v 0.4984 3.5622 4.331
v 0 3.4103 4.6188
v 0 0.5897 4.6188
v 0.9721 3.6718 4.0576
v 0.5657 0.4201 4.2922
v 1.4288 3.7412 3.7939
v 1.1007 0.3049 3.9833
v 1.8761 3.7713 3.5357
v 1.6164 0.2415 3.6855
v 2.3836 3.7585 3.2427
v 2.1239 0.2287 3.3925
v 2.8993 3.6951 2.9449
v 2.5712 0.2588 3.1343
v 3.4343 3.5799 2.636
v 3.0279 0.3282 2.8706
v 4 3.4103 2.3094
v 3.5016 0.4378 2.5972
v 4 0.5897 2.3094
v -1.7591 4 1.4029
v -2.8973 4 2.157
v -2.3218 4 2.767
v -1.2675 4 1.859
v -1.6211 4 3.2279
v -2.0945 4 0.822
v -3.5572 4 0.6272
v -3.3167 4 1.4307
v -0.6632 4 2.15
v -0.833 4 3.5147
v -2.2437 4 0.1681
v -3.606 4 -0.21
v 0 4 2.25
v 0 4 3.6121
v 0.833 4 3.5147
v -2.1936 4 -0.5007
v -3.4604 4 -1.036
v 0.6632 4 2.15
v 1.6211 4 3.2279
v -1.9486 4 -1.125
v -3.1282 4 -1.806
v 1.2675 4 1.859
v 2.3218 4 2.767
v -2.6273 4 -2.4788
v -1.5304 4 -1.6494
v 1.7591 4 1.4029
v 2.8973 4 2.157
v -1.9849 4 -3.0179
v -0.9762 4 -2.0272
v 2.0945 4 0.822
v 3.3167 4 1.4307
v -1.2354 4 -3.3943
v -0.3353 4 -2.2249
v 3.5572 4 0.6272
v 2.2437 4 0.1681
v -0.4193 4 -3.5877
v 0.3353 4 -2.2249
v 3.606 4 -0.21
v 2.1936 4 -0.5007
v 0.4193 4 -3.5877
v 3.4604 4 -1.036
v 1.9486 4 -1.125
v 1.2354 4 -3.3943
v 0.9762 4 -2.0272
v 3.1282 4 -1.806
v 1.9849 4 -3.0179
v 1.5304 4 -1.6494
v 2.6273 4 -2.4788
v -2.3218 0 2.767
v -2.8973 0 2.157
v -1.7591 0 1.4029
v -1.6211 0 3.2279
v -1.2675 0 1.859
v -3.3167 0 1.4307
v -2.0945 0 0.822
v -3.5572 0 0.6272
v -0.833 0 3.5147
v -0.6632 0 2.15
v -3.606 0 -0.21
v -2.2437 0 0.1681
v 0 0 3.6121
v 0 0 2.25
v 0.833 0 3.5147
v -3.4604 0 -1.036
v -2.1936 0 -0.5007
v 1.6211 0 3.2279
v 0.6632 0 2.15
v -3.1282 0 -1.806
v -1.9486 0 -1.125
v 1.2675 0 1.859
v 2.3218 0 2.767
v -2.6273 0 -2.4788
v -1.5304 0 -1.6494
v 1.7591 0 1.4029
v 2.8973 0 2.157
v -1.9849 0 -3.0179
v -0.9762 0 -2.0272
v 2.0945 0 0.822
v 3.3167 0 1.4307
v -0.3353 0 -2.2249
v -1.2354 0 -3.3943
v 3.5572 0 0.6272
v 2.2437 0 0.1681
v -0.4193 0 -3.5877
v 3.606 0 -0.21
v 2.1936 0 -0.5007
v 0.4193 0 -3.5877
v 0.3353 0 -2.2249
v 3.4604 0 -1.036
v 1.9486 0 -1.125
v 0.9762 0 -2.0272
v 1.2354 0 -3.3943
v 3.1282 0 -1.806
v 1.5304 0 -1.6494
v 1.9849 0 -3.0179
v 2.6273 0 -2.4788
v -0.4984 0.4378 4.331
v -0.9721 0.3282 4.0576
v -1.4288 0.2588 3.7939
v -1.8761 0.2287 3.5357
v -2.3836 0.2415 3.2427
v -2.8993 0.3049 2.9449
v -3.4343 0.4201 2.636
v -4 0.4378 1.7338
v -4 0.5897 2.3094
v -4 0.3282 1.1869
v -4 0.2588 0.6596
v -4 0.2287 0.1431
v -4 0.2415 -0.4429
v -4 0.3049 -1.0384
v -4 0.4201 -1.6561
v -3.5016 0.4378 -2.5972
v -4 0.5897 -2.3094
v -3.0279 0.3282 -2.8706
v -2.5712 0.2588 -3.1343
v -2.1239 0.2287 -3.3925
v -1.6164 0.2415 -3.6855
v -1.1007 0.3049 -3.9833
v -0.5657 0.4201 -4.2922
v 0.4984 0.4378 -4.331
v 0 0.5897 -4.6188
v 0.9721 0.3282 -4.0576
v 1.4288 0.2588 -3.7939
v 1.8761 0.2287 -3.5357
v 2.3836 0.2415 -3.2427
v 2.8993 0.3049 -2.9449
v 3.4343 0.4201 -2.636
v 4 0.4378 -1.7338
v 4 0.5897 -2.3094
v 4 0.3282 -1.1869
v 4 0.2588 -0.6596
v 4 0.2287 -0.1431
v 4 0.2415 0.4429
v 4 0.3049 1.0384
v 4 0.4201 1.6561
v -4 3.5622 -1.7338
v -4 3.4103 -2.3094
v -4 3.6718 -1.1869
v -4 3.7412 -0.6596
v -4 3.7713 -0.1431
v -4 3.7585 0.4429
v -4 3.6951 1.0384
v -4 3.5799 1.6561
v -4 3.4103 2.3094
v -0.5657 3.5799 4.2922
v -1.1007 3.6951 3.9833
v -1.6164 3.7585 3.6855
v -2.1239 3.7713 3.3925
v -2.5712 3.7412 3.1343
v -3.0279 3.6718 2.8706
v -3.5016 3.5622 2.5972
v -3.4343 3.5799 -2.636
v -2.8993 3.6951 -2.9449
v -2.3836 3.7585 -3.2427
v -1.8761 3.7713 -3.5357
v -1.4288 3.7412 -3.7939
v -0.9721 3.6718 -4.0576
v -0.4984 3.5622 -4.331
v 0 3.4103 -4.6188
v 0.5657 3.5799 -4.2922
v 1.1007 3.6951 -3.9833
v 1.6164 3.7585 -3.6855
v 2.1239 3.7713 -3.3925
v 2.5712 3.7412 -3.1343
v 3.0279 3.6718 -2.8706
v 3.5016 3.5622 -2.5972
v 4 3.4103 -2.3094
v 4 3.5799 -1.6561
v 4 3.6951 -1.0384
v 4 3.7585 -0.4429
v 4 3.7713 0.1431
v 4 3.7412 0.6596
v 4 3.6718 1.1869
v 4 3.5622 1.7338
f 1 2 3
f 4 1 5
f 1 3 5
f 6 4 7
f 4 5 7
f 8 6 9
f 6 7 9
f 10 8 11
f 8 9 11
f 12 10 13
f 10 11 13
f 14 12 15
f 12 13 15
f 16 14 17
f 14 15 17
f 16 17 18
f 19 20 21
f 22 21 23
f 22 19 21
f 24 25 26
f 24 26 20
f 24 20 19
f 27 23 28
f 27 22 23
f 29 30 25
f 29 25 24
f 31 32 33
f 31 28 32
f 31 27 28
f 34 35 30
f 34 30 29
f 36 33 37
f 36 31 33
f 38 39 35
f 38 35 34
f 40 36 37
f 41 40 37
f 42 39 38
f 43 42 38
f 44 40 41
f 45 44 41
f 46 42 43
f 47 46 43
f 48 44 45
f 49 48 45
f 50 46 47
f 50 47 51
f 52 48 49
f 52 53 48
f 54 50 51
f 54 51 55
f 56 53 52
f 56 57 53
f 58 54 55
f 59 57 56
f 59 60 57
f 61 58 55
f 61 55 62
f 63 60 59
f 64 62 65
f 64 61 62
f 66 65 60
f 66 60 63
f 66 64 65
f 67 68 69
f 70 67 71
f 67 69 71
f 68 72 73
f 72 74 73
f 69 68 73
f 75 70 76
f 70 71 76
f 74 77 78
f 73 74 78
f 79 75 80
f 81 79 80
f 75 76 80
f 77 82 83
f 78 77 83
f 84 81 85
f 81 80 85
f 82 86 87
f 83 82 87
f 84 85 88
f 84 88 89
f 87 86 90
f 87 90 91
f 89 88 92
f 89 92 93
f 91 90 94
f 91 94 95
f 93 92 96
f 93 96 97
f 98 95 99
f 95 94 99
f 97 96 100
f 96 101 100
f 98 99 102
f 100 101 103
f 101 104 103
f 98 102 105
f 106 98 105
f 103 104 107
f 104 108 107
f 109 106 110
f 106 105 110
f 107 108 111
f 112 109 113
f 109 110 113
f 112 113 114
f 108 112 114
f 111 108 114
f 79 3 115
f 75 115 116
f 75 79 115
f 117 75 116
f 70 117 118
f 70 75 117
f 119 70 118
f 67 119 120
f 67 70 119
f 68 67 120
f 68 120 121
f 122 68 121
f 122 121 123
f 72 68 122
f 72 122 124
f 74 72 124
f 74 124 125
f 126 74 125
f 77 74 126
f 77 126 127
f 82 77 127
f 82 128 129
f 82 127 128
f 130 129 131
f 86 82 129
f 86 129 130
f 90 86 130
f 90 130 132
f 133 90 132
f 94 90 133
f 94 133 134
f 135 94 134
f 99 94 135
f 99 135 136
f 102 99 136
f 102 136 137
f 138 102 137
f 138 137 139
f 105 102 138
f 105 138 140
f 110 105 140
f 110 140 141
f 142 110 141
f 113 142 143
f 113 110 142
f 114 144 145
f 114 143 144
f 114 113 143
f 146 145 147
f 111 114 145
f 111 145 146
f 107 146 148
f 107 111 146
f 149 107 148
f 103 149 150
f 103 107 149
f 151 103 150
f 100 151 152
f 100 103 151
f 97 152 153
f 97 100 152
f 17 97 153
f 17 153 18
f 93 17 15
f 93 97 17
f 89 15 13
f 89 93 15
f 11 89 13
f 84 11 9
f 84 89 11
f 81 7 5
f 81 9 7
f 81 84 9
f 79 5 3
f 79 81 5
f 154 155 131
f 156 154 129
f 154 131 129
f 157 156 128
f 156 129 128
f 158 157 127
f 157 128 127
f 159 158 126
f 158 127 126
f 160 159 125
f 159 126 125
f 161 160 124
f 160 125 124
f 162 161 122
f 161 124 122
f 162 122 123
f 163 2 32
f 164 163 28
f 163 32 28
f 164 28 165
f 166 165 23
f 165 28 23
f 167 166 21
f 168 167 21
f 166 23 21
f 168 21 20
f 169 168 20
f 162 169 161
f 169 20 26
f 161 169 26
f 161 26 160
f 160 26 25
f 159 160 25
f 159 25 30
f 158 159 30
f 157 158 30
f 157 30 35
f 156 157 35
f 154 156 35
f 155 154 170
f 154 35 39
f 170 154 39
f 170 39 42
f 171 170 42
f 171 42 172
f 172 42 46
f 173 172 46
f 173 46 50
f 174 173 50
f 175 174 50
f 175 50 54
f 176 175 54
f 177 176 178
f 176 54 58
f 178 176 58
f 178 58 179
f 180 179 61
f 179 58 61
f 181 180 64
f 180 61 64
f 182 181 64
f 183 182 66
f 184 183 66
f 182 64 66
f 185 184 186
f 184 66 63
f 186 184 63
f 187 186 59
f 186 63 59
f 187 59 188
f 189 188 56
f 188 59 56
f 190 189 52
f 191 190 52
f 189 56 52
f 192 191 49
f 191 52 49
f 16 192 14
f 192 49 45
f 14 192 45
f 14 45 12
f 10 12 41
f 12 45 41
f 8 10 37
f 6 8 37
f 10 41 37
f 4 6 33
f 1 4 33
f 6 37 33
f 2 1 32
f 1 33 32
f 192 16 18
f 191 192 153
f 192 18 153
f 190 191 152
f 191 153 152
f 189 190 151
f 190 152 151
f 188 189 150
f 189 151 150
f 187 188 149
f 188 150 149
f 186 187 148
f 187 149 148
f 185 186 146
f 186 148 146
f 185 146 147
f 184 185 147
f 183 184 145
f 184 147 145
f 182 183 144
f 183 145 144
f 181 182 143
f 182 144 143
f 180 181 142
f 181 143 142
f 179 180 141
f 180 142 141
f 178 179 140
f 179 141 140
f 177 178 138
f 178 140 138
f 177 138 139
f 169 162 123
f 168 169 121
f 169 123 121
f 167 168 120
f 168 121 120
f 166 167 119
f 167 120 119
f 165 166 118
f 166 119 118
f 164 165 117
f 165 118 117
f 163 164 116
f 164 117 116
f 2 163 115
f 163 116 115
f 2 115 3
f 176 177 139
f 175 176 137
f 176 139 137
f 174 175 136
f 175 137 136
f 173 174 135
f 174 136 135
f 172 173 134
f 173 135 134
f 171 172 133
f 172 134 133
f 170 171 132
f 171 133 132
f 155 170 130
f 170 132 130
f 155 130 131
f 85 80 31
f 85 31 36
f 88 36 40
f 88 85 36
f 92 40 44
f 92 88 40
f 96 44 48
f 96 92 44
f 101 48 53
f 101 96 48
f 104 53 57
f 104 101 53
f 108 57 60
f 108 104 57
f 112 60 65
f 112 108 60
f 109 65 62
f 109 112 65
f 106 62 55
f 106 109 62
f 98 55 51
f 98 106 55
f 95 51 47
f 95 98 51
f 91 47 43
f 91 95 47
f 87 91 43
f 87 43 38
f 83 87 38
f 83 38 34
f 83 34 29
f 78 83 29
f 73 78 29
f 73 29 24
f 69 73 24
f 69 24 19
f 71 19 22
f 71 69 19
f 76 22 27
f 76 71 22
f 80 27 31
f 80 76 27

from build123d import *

# Parameters (mm, degrees)
SKETCH1_R           = 2.25
BOSS_EXTRUDE1_DEPTH = 4


with BuildPart() as part:
    # Sketch1 → Boss-Extrude1 (new body)
    with BuildSketch(Plane(origin=(0, 0, 0), x_dir=(1, 0, 0), z_dir=(0, 1, 0))):
        Polygon((0, 4.618802154), (-4, 2.309401077), (-4, -2.309401077), (0, -4.618802154), (4, -2.309401077), (4, 2.309401077), align=None)
        with Locations(Location((0, 0, 0), (0, 0, 270))):
            Circle(SKETCH1_R, mode=Mode.SUBTRACT)
    extrude(amount=BOSS_EXTRUDE1_DEPTH)

    # Sketch2 → Cut-Revolve1 (revolve, cut)
    with BuildSketch(Plane(origin=(0, 0, 0), x_dir=(0, 0, -1), z_dir=(1, 0, 0))):
        Polygon((-5.075475812, 3.142855419), (-2.444726969, 4.683764438), (-4.731695124, 4.838553625), align=None)
        Polygon((-4.731695124, -0.838553625), (-5.075475812, 0.857144581), (-2.444726969, -0.683764438), align=None)
    revolve(axis=Axis((0, 4.212316803, 0), (0, -1, 0)), mode=Mode.SUBTRACT)


solid = part.part
